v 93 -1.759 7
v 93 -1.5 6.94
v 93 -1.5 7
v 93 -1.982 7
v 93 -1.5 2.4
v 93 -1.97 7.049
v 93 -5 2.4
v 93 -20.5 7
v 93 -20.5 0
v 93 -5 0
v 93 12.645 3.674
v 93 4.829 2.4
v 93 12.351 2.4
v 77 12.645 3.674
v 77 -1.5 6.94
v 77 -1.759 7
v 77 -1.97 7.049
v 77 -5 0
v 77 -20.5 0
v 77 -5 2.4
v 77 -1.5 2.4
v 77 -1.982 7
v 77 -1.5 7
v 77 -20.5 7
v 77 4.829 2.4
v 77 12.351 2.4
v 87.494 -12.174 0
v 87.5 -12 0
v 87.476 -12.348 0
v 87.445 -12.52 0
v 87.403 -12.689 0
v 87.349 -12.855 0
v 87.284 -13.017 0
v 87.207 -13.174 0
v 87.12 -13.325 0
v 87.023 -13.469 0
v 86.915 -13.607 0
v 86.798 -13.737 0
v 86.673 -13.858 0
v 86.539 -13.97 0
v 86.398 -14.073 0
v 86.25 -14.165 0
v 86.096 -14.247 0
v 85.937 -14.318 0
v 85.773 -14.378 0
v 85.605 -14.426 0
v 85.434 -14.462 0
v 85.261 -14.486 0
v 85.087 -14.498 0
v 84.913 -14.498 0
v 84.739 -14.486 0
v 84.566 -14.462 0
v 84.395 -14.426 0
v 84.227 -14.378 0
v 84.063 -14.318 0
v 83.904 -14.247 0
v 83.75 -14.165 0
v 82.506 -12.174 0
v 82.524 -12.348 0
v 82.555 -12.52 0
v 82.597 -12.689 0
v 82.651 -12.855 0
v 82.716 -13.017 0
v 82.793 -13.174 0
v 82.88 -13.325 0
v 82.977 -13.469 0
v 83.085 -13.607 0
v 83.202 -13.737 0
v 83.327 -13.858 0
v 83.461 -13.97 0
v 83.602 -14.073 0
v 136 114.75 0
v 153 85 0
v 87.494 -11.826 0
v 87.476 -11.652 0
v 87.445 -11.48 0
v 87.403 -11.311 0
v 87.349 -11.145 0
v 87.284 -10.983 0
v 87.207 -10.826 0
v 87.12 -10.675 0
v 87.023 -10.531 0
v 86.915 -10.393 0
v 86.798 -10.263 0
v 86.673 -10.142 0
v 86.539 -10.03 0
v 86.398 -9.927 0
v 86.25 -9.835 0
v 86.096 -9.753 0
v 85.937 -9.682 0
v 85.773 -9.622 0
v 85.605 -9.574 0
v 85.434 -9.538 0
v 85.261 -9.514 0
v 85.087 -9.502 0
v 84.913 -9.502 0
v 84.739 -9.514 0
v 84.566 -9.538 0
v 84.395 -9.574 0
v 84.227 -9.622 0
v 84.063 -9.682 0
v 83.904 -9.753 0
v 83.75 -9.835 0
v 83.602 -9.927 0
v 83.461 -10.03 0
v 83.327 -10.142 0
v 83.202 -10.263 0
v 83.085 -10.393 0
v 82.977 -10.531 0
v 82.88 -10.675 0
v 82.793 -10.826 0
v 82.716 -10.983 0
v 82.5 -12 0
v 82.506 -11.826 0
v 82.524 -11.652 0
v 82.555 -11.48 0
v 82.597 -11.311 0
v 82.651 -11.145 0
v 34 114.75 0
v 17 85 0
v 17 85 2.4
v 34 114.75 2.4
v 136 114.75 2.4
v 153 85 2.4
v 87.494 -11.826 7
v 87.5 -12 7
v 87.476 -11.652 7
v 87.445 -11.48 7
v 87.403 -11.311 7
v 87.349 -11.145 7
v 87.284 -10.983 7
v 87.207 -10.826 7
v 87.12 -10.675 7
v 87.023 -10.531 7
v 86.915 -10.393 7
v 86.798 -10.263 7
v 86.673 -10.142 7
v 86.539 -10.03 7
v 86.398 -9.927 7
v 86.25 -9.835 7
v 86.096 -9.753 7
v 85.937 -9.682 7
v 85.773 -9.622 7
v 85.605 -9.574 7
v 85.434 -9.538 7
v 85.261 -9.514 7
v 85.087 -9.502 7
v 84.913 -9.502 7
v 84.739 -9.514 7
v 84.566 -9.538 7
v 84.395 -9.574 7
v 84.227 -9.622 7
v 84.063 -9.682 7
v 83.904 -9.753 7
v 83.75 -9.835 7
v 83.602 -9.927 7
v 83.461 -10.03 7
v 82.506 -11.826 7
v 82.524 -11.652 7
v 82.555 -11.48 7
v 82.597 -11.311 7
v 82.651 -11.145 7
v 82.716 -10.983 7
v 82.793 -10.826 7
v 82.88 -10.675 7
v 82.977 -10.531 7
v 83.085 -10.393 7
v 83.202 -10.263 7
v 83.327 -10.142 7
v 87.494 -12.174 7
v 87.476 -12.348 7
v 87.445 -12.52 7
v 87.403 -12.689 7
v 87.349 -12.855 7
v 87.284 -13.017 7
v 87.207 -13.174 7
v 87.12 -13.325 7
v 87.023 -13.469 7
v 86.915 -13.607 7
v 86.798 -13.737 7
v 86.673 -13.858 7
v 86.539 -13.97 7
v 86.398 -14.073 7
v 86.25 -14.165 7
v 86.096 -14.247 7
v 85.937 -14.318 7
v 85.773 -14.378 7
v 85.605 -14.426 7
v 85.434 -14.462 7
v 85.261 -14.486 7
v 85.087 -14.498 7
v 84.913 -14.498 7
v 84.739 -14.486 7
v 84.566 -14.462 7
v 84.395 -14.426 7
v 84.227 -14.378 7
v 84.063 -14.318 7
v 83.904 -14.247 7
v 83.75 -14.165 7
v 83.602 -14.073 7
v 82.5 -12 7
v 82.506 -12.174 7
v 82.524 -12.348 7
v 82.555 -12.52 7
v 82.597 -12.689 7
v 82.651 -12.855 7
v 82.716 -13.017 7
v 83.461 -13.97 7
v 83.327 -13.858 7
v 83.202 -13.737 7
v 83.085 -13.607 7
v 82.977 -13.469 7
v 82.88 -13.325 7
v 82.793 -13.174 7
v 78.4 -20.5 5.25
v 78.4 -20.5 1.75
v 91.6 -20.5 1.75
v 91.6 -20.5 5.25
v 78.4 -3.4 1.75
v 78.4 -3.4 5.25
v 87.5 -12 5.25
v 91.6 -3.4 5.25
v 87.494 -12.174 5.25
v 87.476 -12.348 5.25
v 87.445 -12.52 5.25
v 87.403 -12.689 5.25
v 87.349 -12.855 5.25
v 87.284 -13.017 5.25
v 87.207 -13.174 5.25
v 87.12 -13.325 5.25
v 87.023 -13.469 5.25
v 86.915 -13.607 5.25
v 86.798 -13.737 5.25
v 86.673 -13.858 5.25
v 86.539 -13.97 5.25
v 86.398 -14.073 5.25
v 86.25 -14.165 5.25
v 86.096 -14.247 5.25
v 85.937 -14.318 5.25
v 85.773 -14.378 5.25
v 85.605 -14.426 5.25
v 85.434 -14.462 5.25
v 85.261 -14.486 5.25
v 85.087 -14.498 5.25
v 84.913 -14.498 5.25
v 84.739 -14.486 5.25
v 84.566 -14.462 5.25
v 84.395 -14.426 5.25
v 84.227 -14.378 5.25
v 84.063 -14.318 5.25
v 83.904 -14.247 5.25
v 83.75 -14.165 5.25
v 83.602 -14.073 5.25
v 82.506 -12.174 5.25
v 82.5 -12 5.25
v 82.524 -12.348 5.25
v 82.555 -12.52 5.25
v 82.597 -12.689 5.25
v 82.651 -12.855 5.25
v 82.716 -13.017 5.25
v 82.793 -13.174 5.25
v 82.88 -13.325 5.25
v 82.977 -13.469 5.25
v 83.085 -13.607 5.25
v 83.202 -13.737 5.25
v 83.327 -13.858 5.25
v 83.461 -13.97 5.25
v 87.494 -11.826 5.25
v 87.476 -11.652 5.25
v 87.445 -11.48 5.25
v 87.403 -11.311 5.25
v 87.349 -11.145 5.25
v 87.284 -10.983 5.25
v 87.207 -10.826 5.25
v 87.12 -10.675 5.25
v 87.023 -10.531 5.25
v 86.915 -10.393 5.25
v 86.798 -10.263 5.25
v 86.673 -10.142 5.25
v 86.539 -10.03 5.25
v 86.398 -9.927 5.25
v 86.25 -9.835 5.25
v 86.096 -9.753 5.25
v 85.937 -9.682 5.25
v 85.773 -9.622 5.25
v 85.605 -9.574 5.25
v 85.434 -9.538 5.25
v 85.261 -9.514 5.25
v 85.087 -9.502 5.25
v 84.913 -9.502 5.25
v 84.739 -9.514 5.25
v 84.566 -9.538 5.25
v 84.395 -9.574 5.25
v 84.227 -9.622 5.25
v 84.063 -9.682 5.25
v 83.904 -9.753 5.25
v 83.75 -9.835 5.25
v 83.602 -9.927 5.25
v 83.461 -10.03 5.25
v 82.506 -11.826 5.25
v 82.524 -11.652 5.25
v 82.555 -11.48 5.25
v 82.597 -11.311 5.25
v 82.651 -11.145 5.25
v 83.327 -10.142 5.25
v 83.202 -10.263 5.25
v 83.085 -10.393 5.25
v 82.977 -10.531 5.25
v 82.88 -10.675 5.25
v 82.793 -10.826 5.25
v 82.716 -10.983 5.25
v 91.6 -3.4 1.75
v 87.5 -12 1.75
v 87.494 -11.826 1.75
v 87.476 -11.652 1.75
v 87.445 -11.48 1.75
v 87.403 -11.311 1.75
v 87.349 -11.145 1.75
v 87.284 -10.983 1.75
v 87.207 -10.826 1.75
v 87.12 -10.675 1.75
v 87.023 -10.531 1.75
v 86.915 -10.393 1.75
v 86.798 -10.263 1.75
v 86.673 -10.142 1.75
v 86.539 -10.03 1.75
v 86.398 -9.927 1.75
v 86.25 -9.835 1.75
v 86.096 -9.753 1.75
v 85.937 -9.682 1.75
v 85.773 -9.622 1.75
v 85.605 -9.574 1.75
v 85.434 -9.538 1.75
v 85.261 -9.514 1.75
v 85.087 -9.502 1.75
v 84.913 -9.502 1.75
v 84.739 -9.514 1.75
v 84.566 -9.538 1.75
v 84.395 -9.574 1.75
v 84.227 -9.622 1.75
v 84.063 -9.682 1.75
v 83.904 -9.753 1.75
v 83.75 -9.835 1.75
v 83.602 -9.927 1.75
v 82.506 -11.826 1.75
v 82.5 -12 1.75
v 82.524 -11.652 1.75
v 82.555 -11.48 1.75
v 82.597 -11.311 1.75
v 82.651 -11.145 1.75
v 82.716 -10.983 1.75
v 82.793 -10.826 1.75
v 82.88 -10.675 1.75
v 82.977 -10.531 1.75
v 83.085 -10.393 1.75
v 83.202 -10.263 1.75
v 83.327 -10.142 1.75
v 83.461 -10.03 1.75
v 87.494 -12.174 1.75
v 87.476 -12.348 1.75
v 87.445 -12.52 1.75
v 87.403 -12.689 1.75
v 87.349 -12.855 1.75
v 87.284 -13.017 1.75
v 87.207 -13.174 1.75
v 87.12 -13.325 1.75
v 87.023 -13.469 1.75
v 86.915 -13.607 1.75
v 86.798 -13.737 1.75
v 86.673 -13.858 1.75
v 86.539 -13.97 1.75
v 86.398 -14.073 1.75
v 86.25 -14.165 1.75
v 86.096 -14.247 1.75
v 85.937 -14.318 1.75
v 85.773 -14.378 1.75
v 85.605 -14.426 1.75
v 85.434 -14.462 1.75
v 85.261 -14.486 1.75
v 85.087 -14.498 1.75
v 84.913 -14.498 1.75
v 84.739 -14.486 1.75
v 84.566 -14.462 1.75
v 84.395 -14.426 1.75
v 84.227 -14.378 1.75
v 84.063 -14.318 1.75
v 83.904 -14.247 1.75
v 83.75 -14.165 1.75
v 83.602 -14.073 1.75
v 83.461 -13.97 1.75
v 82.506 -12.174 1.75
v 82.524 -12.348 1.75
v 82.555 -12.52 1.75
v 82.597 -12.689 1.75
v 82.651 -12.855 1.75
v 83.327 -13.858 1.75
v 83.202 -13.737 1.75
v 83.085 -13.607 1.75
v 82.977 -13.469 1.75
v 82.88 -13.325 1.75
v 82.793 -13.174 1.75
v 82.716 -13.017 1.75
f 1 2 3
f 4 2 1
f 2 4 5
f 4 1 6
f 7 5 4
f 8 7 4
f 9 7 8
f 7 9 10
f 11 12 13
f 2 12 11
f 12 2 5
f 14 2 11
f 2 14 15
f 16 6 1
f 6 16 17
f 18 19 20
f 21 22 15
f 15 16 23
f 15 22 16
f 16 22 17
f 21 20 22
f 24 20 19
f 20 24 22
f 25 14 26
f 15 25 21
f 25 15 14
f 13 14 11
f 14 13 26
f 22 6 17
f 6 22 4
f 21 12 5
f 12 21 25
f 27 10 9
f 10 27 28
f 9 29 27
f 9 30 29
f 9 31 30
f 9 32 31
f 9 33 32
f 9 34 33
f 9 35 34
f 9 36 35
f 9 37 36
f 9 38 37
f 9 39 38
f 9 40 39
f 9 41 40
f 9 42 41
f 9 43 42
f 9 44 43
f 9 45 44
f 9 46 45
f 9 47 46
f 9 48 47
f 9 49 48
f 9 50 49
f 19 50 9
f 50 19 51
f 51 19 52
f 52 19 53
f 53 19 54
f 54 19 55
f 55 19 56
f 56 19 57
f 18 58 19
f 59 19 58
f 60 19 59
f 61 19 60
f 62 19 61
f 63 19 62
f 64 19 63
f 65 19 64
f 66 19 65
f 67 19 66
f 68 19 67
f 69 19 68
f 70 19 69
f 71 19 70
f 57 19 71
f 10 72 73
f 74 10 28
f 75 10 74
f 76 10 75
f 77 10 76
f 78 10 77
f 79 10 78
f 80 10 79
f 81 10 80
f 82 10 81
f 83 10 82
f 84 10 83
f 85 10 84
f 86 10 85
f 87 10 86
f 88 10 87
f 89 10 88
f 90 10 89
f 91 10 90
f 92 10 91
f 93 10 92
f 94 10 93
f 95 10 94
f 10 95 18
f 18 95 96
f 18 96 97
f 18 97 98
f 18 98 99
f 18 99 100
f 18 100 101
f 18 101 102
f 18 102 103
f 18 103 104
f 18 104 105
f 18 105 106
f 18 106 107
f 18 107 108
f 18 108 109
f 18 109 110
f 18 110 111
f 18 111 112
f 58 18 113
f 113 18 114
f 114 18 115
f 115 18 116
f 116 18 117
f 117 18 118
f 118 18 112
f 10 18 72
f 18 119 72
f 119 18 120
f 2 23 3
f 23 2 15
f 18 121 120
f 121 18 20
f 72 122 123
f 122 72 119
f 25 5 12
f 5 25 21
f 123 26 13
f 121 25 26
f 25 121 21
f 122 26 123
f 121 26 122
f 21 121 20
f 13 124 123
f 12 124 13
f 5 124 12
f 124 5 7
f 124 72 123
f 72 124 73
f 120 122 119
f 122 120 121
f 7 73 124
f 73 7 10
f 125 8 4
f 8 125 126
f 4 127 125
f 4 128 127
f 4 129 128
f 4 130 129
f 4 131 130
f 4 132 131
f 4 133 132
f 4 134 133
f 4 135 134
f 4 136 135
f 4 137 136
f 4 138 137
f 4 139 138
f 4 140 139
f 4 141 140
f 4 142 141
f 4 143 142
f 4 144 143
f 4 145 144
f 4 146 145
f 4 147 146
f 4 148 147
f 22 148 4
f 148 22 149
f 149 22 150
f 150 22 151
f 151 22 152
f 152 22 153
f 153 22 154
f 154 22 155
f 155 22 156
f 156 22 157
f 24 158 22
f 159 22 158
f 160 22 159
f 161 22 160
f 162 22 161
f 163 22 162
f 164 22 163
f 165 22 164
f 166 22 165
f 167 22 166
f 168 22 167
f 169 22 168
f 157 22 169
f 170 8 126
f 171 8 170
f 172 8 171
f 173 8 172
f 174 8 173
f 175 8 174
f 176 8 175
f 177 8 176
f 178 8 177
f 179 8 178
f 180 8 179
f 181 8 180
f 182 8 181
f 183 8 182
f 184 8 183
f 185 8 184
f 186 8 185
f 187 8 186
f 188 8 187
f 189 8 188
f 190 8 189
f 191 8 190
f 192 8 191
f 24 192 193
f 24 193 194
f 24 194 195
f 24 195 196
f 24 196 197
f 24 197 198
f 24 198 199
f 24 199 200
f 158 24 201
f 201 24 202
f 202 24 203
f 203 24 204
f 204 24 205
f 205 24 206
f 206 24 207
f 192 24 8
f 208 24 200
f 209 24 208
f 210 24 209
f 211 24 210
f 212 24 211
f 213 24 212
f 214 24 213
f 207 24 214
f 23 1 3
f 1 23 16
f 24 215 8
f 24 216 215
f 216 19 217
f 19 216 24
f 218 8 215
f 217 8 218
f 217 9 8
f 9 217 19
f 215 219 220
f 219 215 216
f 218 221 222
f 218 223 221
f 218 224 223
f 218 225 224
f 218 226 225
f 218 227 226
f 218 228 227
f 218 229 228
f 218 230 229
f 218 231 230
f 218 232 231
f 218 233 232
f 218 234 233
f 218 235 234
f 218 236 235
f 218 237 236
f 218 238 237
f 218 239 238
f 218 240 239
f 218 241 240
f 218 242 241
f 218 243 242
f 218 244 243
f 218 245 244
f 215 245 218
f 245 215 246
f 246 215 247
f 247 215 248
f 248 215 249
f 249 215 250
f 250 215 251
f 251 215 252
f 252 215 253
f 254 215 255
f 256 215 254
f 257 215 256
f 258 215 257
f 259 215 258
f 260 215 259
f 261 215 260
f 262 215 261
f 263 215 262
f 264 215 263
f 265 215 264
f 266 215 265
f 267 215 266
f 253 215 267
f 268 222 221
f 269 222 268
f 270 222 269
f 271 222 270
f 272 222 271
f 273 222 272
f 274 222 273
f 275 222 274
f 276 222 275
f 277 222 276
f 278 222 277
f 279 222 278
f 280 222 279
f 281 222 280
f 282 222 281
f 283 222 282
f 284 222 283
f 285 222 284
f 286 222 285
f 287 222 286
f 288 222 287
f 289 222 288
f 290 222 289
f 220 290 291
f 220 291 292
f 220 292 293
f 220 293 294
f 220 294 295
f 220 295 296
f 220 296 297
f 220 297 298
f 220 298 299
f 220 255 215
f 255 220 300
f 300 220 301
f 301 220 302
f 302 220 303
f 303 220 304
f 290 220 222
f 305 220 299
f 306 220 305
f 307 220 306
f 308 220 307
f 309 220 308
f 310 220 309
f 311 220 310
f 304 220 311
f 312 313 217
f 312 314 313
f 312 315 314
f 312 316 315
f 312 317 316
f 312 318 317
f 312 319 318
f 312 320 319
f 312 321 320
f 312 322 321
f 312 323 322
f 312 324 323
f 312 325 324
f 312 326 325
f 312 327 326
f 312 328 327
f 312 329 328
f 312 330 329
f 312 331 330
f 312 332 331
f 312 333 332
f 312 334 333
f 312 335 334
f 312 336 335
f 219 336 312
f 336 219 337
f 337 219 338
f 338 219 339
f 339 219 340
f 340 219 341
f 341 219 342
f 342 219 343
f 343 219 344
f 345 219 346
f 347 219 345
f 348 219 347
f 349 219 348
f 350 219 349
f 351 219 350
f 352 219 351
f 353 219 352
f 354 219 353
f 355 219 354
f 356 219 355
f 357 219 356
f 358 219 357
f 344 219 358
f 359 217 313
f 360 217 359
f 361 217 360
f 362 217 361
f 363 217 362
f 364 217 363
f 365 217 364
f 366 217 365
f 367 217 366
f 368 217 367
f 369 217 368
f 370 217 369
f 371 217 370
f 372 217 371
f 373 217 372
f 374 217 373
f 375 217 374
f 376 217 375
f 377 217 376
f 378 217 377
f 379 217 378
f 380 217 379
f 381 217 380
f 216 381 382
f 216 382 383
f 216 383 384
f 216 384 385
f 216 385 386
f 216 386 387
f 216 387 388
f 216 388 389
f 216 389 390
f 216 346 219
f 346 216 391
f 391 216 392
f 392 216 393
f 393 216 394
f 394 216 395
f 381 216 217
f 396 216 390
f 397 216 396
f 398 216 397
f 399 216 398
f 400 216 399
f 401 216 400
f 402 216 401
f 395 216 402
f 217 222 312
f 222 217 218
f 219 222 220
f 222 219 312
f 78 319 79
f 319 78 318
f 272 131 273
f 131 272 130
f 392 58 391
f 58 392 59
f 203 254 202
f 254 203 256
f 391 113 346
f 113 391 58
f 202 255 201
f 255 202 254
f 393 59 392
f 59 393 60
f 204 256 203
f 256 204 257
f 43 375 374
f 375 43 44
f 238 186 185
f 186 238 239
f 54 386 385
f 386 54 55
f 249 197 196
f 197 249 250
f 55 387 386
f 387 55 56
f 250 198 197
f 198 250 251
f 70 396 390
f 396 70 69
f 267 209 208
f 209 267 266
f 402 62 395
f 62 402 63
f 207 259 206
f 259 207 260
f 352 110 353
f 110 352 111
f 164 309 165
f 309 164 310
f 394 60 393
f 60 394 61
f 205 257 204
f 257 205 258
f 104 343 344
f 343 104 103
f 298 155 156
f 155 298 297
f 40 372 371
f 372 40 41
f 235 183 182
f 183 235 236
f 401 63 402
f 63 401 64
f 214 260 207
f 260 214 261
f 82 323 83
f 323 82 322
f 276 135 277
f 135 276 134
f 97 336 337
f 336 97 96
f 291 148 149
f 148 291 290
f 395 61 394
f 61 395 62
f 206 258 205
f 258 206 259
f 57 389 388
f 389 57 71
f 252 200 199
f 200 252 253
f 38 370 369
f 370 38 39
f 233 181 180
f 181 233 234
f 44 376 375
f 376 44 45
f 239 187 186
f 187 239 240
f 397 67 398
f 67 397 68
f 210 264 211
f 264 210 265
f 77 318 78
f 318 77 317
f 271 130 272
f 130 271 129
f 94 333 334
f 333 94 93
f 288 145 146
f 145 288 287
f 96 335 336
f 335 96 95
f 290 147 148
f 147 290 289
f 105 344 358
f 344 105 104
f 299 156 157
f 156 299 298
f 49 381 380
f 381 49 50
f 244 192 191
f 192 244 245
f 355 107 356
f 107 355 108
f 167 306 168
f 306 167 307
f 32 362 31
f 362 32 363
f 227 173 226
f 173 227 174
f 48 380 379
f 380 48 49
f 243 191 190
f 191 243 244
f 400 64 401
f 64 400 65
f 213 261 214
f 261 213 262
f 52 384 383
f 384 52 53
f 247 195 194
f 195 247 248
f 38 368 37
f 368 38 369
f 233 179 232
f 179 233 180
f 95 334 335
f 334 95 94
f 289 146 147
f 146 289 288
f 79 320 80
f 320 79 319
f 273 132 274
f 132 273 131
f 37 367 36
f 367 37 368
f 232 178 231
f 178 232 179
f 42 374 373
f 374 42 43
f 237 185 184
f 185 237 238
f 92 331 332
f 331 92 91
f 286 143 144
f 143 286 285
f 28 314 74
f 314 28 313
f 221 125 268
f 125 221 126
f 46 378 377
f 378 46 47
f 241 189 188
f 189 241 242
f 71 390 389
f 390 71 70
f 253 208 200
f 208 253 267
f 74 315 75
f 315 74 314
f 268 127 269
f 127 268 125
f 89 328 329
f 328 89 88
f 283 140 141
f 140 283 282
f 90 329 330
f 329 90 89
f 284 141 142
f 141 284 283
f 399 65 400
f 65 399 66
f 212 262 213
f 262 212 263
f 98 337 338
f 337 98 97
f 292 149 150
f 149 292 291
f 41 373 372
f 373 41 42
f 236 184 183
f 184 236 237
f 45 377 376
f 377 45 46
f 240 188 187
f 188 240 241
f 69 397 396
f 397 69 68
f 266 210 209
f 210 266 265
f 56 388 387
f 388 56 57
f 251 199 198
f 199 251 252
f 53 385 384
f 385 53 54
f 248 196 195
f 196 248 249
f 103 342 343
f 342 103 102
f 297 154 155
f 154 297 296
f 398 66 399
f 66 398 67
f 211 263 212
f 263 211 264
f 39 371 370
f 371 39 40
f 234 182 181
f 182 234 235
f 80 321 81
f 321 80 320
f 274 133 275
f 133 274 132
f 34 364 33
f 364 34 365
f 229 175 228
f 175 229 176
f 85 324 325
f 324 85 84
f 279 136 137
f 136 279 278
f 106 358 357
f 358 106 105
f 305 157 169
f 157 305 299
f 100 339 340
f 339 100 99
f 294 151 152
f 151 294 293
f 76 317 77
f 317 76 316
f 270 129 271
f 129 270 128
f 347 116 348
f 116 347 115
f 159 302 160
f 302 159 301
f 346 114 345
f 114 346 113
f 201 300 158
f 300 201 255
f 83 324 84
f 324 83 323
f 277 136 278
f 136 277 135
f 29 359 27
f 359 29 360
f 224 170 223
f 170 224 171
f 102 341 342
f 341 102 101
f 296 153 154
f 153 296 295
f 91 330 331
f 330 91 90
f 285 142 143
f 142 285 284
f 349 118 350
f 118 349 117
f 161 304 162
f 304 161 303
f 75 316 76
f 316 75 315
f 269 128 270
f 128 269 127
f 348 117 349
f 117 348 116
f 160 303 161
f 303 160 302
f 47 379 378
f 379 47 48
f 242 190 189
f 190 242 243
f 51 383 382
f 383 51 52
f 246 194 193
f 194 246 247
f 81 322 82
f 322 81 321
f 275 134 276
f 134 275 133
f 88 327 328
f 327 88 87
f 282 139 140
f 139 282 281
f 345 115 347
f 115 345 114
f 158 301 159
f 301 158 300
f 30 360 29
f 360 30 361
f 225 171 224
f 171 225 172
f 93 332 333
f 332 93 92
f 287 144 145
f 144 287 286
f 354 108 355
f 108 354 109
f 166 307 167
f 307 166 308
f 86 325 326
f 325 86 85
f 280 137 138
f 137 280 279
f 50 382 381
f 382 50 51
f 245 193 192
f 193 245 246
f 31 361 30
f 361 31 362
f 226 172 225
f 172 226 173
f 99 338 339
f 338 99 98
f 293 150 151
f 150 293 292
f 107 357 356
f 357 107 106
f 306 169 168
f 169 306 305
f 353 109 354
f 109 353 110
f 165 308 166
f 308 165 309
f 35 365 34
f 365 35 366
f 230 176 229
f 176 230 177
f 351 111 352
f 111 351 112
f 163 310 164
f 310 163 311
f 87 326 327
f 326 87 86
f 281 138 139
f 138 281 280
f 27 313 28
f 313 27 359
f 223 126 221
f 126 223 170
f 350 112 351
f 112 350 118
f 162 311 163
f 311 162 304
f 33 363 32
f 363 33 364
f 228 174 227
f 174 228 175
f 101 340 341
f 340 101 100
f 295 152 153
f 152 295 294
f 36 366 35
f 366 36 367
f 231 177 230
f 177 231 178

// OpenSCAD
$fn = 90;

difference() {
    flap();
    mount();
}
mount(filled = true);

module flap() {
    scale([17, 17, 2.4]) linear_extrude(1) polygon([
        [1, 5],
        [2, 6.75],
        [8, 6.75],
        [9, 5],
        [5, -1]
    ]);
}

module mount(filled = false) {
    translate([85, -11, 3.5]) rotate([0, 0, 180]) difference() {
        cube([16, 19, 7], true);
        if (filled) translate([0, 1, 0]) cube([13.2, 17.2, 3.5], true);
        if (filled) translate([0, 7 - 6, -10]) cylinder(d = 5, h = 20);
    }
    translate([85, 5, 3.9]) {
        rotate([-13, 0, 0]) cube([16, 15, 3], true);
        translate([0, -4, 0]) rotate([0, 0, 0]) cube([16, 8, 3], true);
    }
}
